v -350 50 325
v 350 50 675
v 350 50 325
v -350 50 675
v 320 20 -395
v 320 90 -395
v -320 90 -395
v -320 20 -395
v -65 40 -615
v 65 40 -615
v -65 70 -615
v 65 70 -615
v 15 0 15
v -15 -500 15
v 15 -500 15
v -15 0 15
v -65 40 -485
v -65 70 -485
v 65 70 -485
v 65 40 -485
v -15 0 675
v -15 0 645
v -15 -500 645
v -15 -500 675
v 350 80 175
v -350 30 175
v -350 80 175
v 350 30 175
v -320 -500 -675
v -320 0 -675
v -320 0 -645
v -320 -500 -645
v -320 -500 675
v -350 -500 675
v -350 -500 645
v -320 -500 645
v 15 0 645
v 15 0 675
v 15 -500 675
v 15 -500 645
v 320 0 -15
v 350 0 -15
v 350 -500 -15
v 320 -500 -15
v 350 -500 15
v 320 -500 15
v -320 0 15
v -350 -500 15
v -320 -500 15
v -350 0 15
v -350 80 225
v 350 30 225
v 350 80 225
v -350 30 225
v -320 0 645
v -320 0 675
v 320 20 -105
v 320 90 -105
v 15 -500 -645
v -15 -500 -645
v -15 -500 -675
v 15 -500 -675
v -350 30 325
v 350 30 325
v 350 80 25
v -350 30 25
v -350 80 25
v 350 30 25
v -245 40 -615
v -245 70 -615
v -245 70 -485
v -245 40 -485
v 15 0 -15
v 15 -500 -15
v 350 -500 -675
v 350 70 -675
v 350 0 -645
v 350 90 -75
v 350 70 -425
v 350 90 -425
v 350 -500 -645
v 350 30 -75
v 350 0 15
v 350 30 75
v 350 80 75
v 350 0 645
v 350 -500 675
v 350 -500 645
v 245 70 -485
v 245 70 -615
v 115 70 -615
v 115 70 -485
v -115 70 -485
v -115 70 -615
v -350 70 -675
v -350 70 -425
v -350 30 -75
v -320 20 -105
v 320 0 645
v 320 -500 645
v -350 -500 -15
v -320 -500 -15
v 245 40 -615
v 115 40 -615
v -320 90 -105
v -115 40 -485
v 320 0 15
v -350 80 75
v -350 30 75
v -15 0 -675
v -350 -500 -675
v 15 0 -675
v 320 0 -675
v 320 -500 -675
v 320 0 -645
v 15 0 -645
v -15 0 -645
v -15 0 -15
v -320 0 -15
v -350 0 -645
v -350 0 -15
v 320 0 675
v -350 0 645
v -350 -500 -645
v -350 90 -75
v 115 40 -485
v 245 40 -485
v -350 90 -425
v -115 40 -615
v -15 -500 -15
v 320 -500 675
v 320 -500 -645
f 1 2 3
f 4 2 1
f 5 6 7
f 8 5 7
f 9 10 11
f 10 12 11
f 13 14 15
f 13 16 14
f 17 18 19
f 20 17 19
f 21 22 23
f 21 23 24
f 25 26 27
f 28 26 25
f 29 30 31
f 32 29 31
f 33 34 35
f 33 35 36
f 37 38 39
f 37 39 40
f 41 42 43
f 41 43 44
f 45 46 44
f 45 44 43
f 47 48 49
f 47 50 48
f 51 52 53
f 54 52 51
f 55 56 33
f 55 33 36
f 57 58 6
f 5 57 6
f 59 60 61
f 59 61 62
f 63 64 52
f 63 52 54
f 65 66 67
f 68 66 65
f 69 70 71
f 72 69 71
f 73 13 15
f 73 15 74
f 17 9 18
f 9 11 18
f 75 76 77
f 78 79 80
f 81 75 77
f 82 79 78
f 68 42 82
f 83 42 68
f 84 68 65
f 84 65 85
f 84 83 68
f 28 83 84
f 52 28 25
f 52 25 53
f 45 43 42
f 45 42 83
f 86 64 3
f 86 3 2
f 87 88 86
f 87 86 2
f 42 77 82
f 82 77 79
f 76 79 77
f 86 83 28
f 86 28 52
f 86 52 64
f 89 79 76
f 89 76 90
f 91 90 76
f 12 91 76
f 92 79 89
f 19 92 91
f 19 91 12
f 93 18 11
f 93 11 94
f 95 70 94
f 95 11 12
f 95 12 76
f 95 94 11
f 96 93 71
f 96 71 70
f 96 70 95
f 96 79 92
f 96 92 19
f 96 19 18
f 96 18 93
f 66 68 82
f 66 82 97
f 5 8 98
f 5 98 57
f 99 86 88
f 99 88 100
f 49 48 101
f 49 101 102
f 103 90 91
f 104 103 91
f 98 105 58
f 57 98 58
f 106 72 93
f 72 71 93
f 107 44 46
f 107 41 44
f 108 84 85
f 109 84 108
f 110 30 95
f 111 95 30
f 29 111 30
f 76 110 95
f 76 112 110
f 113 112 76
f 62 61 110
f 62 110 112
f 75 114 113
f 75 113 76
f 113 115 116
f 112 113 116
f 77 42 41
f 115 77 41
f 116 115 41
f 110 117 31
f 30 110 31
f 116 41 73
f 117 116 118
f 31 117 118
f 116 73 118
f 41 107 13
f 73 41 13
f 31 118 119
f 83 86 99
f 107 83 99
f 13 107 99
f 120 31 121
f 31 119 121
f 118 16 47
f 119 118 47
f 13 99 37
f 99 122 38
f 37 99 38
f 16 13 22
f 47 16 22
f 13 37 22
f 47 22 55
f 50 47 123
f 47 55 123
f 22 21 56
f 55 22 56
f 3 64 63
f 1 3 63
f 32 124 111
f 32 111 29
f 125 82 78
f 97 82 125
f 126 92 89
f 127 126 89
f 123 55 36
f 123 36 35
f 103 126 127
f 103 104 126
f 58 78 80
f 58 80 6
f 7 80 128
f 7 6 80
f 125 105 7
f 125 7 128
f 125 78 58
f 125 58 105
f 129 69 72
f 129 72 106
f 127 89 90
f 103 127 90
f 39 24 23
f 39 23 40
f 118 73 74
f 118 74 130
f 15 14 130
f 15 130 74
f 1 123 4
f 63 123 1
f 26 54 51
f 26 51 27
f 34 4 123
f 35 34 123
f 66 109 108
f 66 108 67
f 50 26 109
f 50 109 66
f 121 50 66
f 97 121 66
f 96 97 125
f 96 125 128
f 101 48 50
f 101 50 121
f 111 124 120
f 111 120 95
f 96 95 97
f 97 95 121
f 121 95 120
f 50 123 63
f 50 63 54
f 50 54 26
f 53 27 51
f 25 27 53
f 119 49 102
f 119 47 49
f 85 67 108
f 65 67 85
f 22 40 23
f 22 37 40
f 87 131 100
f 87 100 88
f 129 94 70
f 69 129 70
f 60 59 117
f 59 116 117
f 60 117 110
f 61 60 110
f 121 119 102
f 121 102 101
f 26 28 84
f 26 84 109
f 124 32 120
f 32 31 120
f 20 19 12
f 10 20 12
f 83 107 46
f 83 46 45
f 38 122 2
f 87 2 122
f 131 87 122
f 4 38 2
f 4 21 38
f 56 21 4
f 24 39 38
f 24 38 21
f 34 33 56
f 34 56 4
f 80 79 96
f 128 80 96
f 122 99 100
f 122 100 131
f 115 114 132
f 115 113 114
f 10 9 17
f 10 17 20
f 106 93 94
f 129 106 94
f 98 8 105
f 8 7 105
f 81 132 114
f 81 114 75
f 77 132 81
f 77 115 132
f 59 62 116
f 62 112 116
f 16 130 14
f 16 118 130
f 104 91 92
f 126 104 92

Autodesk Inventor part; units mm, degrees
ref_plane "YZ Plane" through (0, 0, 0) normal (1, 0, 0) x (0, 1, 0)
ref_plane "XZ Plane" through (0, 0, 0) normal (0, 1, 0) x (-1, 0, 0)
ref_plane "XY Plane" through (0, 0, 0) normal (0, 0, 1) x (1, 0, 0)
sketch "Sketch1" plane through (0, 0, 0) normal (0, 1, 0) x (-1, 0, 0)
  line L0 (-350, 675) -> (350, 675)
  line L1 (350, 675) -> (350, -675)
  line L2 (350, -675) -> (-350, -675)
  line L3 (-350, -675) -> (-350, 675)
  line L4 (-350, 675) -> (350, -675) construction
  line L5 (350, 675) -> (-350, -675) construction
  line L6 (350, 675) -> (-350, 675)
  line L7 (-350, 675) -> (-350, 325)
  line L8 (-350, 325) -> (350, 325)
  line L9 (350, 325) -> (350, 675)
  line L10 (350, 325) -> (-350, 325)
  line L11 (-350, 325) -> (-350, -75)
  line L12 (-350, -75) -> (350, -75)
  line L13 (350, -75) -> (350, 325)
  line L14 (350, -75) -> (-350, -75)
  line L15 (-350, -75) -> (-350, -425)
  line L16 (-350, -425) -> (350, -425)
  line L17 (350, -425) -> (350, -75)
  line L18 (350, -425) -> (-350, -425)
  line L19 (-350, -425) -> (-350, -675)
  line L20 (-350, -675) -> (350, -675)
  line L21 (350, -675) -> (350, -425)
  point P0 (0, 0)
  dimension "d1" = 1350
  dimension "d2" = 700
  dimension "d3" = 350
  dimension "d4" = 400
  dimension "d5" = 350
extrude "Extrusion1" add sketch "Sketch1" along normal blind 50 contours L0 L1 L8 L3
extrude "Extrusion2" add sketch "Sketch1" along normal blind 30 contours L8 L1 L12 L3
extrude "Extrusion3" add sketch "Sketch1" along normal blind 90 contours L12 L1 L16 L3
extrude "Extrusion4" add sketch "Sketch1" along normal blind 70 contours L16 L1 L2 L3
sketch "Sketch2" plane through (0, 90, 0) normal (0, 1, 0) x (1, 0, 0)
  line L0 (-320, 105) -> (320, 105)
  line L1 (320, 105) -> (320, 395)
  line L2 (320, 395) -> (-320, 395)
  line L3 (-320, 395) -> (-320, 105)
  line L4 (-350, 75) -> (350, 75) projected
  line L5 (-350, 425) -> (-350, 75) projected
  line L6 (350, 75) -> (350, 425) projected
  line L7 (350, 425) -> (-350, 425) projected
  line L8 (-245, 485) -> (-115, 485)
  line L9 (-115, 485) -> (-115, 615)
  line L10 (-115, 615) -> (-245, 615)
  line L11 (-245, 615) -> (-245, 485)
  line L12 (-65, 485) -> (65, 485)
  line L13 (65, 485) -> (65, 615)
  line L14 (65, 615) -> (-65, 615)
  line L15 (-65, 615) -> (-65, 485)
  line L16 (115, 485) -> (245, 485)
  line L17 (245, 485) -> (245, 615)
  line L18 (245, 615) -> (115, 615)
  line L19 (115, 615) -> (115, 485)
  line L20 (-350, 675) -> (-350, 425) projected
  point P0 (0, 0)
  point P1 (320, 250)
  dimension "d14" = 30
  dimension "d15" = 30
  dimension "d16" = 30
  dimension "d17" = 30
  dimension "d18" = 130
  dimension "d19" = 130
  dimension "d20" = 105
  dimension "d21" = 60
  dimension "d22" = 50
  dimension "d23" = 50
extrude "Extrusion5" cut sketch "Sketch2" against normal blind 70 contours L3 L2 L1 L0
extrude "Extrusion6" cut sketch "Sketch2" against normal blind 50 contours L11 L10 L9 L8 | L15 L14 L13 L12 | L19 L18 L17 L16
sketch "Sketch4" plane through (0, 0, 0) normal (0, -1, 0) x (1, 0, 0)
  line L0 (-350, -675) -> (-350, 675) projected
  line L1 (-350, 675) -> (-320, 675)
  line L2 (-320, 675) -> (-320, 645)
  line L3 (-320, 645) -> (-350, 645)
  line L4 (-350, 645) -> (-350, 675)
  line L5 (-350, 675) -> (350, 675) projected
  line L6 (350, 675) -> (350, -675) projected
  line L7 (320, 675) -> (350, 675)
  line L8 (350, 675) -> (350, 645)
  line L9 (350, 645) -> (320, 645)
  line L10 (320, 645) -> (320, 675)
  line L11 (-350, -675) -> (-350, -425) projected
  line L12 (-350, -675) -> (-320, -675)
  line L13 (-320, -675) -> (-320, -645)
  line L14 (-320, -645) -> (-350, -645)
  line L15 (-350, -645) -> (-350, -675)
  line L16 (350, -675) -> (320, -675)
  line L17 (320, -675) -> (320, -645)
  line L18 (320, -645) -> (350, -645)
  line L19 (350, -645) -> (350, -675)
  line L20 (-15, 675) -> (15, 675)
  line L21 (15, 675) -> (15, 645)
  line L22 (15, 645) -> (-15, 645)
  line L23 (-15, 645) -> (-15, 675)
  line L24 (350, -675) -> (-350, -675) projected
  line L25 (-15, -675) -> (15, -675)
  line L26 (15, -675) -> (15, -645)
  line L27 (15, -645) -> (-15, -645)
  line L28 (-15, -645) -> (-15, -675)
  line L29 (-350, 15) -> (-320, 15)
  line L30 (-320, 15) -> (-320, -15)
  line L31 (-320, -15) -> (-350, -15)
  line L32 (-350, -15) -> (-350, 15)
  line L33 (320, 15) -> (350, 15)
  line L34 (350, 15) -> (350, -15)
  line L35 (350, -15) -> (320, -15)
  line L36 (320, -15) -> (320, 15)
  line L37 (-15, 15) -> (15, 15)
  line L38 (15, 15) -> (15, -15)
  line L39 (15, -15) -> (-15, -15)
  line L40 (-15, -15) -> (-15, 15)
  point P0 (0, 0)
  point P1 (0, -645)
  point P2 (0, -675)
  point P3 (0, 645)
  point P4 (320, 0)
  point P5 (-320, 0)
  point P6 (-350, 0)
  point P7 (350, 0)
  point P8 (0, 15)
  point P9 (15, 0)
  dimension "d32" = 30
  dimension "d33" = 30
extrude "Extrusion8" add sketch "Sketch4" along normal blind 500 contours L0 L14 L13 L12 | L28 L27 L26 L24 | L0 L29 L30 L31 | L17 L18 L6 L16 | L0 L1 L2 L3 | L35 L36 L33 L6 | L5 L21 L22 L23 | L9 L10 L5 L6 | L37 L38 L39 L40
sketch "Sketch5" plane through (0, 30, 0) normal (0, 1, 0) x (1, 0, 0)
  line L0 (-350, 75) -> (-350, -325) projected
  line L1 (350, -325) -> (350, 75) projected
  line L2 (-350, -25) -> (350, -25)
  line L3 (350, -25) -> (350, -75)
  line L4 (350, -75) -> (-350, -75)
  line L5 (-350, -75) -> (-350, -25)
  line L6 (-350, -175) -> (350, -175)
  line L7 (350, -175) -> (350, -225)
  line L8 (350, -225) -> (-350, -225)
  line L9 (-350, -225) -> (-350, -175)
  line L10 (350, -325) -> (-350, -325) projected
  line L11 (-350, 75) -> (350, 75) projected
  point P0 (0, 0)
  point P1 (350, -25)
  point P2 (-350, -225)
  point P3 (350, -175)
  dimension "d36" = 700
  dimension "d37" = 50
  dimension "d38" = 50
  dimension "d39" = 100
  dimension "d40" = 100
extrude "Extrusion9" add sketch "Sketch5" along normal blind 50 contours L2 L1 L4 L0 | L6 L1 L8 L0
properties part number "Table"
